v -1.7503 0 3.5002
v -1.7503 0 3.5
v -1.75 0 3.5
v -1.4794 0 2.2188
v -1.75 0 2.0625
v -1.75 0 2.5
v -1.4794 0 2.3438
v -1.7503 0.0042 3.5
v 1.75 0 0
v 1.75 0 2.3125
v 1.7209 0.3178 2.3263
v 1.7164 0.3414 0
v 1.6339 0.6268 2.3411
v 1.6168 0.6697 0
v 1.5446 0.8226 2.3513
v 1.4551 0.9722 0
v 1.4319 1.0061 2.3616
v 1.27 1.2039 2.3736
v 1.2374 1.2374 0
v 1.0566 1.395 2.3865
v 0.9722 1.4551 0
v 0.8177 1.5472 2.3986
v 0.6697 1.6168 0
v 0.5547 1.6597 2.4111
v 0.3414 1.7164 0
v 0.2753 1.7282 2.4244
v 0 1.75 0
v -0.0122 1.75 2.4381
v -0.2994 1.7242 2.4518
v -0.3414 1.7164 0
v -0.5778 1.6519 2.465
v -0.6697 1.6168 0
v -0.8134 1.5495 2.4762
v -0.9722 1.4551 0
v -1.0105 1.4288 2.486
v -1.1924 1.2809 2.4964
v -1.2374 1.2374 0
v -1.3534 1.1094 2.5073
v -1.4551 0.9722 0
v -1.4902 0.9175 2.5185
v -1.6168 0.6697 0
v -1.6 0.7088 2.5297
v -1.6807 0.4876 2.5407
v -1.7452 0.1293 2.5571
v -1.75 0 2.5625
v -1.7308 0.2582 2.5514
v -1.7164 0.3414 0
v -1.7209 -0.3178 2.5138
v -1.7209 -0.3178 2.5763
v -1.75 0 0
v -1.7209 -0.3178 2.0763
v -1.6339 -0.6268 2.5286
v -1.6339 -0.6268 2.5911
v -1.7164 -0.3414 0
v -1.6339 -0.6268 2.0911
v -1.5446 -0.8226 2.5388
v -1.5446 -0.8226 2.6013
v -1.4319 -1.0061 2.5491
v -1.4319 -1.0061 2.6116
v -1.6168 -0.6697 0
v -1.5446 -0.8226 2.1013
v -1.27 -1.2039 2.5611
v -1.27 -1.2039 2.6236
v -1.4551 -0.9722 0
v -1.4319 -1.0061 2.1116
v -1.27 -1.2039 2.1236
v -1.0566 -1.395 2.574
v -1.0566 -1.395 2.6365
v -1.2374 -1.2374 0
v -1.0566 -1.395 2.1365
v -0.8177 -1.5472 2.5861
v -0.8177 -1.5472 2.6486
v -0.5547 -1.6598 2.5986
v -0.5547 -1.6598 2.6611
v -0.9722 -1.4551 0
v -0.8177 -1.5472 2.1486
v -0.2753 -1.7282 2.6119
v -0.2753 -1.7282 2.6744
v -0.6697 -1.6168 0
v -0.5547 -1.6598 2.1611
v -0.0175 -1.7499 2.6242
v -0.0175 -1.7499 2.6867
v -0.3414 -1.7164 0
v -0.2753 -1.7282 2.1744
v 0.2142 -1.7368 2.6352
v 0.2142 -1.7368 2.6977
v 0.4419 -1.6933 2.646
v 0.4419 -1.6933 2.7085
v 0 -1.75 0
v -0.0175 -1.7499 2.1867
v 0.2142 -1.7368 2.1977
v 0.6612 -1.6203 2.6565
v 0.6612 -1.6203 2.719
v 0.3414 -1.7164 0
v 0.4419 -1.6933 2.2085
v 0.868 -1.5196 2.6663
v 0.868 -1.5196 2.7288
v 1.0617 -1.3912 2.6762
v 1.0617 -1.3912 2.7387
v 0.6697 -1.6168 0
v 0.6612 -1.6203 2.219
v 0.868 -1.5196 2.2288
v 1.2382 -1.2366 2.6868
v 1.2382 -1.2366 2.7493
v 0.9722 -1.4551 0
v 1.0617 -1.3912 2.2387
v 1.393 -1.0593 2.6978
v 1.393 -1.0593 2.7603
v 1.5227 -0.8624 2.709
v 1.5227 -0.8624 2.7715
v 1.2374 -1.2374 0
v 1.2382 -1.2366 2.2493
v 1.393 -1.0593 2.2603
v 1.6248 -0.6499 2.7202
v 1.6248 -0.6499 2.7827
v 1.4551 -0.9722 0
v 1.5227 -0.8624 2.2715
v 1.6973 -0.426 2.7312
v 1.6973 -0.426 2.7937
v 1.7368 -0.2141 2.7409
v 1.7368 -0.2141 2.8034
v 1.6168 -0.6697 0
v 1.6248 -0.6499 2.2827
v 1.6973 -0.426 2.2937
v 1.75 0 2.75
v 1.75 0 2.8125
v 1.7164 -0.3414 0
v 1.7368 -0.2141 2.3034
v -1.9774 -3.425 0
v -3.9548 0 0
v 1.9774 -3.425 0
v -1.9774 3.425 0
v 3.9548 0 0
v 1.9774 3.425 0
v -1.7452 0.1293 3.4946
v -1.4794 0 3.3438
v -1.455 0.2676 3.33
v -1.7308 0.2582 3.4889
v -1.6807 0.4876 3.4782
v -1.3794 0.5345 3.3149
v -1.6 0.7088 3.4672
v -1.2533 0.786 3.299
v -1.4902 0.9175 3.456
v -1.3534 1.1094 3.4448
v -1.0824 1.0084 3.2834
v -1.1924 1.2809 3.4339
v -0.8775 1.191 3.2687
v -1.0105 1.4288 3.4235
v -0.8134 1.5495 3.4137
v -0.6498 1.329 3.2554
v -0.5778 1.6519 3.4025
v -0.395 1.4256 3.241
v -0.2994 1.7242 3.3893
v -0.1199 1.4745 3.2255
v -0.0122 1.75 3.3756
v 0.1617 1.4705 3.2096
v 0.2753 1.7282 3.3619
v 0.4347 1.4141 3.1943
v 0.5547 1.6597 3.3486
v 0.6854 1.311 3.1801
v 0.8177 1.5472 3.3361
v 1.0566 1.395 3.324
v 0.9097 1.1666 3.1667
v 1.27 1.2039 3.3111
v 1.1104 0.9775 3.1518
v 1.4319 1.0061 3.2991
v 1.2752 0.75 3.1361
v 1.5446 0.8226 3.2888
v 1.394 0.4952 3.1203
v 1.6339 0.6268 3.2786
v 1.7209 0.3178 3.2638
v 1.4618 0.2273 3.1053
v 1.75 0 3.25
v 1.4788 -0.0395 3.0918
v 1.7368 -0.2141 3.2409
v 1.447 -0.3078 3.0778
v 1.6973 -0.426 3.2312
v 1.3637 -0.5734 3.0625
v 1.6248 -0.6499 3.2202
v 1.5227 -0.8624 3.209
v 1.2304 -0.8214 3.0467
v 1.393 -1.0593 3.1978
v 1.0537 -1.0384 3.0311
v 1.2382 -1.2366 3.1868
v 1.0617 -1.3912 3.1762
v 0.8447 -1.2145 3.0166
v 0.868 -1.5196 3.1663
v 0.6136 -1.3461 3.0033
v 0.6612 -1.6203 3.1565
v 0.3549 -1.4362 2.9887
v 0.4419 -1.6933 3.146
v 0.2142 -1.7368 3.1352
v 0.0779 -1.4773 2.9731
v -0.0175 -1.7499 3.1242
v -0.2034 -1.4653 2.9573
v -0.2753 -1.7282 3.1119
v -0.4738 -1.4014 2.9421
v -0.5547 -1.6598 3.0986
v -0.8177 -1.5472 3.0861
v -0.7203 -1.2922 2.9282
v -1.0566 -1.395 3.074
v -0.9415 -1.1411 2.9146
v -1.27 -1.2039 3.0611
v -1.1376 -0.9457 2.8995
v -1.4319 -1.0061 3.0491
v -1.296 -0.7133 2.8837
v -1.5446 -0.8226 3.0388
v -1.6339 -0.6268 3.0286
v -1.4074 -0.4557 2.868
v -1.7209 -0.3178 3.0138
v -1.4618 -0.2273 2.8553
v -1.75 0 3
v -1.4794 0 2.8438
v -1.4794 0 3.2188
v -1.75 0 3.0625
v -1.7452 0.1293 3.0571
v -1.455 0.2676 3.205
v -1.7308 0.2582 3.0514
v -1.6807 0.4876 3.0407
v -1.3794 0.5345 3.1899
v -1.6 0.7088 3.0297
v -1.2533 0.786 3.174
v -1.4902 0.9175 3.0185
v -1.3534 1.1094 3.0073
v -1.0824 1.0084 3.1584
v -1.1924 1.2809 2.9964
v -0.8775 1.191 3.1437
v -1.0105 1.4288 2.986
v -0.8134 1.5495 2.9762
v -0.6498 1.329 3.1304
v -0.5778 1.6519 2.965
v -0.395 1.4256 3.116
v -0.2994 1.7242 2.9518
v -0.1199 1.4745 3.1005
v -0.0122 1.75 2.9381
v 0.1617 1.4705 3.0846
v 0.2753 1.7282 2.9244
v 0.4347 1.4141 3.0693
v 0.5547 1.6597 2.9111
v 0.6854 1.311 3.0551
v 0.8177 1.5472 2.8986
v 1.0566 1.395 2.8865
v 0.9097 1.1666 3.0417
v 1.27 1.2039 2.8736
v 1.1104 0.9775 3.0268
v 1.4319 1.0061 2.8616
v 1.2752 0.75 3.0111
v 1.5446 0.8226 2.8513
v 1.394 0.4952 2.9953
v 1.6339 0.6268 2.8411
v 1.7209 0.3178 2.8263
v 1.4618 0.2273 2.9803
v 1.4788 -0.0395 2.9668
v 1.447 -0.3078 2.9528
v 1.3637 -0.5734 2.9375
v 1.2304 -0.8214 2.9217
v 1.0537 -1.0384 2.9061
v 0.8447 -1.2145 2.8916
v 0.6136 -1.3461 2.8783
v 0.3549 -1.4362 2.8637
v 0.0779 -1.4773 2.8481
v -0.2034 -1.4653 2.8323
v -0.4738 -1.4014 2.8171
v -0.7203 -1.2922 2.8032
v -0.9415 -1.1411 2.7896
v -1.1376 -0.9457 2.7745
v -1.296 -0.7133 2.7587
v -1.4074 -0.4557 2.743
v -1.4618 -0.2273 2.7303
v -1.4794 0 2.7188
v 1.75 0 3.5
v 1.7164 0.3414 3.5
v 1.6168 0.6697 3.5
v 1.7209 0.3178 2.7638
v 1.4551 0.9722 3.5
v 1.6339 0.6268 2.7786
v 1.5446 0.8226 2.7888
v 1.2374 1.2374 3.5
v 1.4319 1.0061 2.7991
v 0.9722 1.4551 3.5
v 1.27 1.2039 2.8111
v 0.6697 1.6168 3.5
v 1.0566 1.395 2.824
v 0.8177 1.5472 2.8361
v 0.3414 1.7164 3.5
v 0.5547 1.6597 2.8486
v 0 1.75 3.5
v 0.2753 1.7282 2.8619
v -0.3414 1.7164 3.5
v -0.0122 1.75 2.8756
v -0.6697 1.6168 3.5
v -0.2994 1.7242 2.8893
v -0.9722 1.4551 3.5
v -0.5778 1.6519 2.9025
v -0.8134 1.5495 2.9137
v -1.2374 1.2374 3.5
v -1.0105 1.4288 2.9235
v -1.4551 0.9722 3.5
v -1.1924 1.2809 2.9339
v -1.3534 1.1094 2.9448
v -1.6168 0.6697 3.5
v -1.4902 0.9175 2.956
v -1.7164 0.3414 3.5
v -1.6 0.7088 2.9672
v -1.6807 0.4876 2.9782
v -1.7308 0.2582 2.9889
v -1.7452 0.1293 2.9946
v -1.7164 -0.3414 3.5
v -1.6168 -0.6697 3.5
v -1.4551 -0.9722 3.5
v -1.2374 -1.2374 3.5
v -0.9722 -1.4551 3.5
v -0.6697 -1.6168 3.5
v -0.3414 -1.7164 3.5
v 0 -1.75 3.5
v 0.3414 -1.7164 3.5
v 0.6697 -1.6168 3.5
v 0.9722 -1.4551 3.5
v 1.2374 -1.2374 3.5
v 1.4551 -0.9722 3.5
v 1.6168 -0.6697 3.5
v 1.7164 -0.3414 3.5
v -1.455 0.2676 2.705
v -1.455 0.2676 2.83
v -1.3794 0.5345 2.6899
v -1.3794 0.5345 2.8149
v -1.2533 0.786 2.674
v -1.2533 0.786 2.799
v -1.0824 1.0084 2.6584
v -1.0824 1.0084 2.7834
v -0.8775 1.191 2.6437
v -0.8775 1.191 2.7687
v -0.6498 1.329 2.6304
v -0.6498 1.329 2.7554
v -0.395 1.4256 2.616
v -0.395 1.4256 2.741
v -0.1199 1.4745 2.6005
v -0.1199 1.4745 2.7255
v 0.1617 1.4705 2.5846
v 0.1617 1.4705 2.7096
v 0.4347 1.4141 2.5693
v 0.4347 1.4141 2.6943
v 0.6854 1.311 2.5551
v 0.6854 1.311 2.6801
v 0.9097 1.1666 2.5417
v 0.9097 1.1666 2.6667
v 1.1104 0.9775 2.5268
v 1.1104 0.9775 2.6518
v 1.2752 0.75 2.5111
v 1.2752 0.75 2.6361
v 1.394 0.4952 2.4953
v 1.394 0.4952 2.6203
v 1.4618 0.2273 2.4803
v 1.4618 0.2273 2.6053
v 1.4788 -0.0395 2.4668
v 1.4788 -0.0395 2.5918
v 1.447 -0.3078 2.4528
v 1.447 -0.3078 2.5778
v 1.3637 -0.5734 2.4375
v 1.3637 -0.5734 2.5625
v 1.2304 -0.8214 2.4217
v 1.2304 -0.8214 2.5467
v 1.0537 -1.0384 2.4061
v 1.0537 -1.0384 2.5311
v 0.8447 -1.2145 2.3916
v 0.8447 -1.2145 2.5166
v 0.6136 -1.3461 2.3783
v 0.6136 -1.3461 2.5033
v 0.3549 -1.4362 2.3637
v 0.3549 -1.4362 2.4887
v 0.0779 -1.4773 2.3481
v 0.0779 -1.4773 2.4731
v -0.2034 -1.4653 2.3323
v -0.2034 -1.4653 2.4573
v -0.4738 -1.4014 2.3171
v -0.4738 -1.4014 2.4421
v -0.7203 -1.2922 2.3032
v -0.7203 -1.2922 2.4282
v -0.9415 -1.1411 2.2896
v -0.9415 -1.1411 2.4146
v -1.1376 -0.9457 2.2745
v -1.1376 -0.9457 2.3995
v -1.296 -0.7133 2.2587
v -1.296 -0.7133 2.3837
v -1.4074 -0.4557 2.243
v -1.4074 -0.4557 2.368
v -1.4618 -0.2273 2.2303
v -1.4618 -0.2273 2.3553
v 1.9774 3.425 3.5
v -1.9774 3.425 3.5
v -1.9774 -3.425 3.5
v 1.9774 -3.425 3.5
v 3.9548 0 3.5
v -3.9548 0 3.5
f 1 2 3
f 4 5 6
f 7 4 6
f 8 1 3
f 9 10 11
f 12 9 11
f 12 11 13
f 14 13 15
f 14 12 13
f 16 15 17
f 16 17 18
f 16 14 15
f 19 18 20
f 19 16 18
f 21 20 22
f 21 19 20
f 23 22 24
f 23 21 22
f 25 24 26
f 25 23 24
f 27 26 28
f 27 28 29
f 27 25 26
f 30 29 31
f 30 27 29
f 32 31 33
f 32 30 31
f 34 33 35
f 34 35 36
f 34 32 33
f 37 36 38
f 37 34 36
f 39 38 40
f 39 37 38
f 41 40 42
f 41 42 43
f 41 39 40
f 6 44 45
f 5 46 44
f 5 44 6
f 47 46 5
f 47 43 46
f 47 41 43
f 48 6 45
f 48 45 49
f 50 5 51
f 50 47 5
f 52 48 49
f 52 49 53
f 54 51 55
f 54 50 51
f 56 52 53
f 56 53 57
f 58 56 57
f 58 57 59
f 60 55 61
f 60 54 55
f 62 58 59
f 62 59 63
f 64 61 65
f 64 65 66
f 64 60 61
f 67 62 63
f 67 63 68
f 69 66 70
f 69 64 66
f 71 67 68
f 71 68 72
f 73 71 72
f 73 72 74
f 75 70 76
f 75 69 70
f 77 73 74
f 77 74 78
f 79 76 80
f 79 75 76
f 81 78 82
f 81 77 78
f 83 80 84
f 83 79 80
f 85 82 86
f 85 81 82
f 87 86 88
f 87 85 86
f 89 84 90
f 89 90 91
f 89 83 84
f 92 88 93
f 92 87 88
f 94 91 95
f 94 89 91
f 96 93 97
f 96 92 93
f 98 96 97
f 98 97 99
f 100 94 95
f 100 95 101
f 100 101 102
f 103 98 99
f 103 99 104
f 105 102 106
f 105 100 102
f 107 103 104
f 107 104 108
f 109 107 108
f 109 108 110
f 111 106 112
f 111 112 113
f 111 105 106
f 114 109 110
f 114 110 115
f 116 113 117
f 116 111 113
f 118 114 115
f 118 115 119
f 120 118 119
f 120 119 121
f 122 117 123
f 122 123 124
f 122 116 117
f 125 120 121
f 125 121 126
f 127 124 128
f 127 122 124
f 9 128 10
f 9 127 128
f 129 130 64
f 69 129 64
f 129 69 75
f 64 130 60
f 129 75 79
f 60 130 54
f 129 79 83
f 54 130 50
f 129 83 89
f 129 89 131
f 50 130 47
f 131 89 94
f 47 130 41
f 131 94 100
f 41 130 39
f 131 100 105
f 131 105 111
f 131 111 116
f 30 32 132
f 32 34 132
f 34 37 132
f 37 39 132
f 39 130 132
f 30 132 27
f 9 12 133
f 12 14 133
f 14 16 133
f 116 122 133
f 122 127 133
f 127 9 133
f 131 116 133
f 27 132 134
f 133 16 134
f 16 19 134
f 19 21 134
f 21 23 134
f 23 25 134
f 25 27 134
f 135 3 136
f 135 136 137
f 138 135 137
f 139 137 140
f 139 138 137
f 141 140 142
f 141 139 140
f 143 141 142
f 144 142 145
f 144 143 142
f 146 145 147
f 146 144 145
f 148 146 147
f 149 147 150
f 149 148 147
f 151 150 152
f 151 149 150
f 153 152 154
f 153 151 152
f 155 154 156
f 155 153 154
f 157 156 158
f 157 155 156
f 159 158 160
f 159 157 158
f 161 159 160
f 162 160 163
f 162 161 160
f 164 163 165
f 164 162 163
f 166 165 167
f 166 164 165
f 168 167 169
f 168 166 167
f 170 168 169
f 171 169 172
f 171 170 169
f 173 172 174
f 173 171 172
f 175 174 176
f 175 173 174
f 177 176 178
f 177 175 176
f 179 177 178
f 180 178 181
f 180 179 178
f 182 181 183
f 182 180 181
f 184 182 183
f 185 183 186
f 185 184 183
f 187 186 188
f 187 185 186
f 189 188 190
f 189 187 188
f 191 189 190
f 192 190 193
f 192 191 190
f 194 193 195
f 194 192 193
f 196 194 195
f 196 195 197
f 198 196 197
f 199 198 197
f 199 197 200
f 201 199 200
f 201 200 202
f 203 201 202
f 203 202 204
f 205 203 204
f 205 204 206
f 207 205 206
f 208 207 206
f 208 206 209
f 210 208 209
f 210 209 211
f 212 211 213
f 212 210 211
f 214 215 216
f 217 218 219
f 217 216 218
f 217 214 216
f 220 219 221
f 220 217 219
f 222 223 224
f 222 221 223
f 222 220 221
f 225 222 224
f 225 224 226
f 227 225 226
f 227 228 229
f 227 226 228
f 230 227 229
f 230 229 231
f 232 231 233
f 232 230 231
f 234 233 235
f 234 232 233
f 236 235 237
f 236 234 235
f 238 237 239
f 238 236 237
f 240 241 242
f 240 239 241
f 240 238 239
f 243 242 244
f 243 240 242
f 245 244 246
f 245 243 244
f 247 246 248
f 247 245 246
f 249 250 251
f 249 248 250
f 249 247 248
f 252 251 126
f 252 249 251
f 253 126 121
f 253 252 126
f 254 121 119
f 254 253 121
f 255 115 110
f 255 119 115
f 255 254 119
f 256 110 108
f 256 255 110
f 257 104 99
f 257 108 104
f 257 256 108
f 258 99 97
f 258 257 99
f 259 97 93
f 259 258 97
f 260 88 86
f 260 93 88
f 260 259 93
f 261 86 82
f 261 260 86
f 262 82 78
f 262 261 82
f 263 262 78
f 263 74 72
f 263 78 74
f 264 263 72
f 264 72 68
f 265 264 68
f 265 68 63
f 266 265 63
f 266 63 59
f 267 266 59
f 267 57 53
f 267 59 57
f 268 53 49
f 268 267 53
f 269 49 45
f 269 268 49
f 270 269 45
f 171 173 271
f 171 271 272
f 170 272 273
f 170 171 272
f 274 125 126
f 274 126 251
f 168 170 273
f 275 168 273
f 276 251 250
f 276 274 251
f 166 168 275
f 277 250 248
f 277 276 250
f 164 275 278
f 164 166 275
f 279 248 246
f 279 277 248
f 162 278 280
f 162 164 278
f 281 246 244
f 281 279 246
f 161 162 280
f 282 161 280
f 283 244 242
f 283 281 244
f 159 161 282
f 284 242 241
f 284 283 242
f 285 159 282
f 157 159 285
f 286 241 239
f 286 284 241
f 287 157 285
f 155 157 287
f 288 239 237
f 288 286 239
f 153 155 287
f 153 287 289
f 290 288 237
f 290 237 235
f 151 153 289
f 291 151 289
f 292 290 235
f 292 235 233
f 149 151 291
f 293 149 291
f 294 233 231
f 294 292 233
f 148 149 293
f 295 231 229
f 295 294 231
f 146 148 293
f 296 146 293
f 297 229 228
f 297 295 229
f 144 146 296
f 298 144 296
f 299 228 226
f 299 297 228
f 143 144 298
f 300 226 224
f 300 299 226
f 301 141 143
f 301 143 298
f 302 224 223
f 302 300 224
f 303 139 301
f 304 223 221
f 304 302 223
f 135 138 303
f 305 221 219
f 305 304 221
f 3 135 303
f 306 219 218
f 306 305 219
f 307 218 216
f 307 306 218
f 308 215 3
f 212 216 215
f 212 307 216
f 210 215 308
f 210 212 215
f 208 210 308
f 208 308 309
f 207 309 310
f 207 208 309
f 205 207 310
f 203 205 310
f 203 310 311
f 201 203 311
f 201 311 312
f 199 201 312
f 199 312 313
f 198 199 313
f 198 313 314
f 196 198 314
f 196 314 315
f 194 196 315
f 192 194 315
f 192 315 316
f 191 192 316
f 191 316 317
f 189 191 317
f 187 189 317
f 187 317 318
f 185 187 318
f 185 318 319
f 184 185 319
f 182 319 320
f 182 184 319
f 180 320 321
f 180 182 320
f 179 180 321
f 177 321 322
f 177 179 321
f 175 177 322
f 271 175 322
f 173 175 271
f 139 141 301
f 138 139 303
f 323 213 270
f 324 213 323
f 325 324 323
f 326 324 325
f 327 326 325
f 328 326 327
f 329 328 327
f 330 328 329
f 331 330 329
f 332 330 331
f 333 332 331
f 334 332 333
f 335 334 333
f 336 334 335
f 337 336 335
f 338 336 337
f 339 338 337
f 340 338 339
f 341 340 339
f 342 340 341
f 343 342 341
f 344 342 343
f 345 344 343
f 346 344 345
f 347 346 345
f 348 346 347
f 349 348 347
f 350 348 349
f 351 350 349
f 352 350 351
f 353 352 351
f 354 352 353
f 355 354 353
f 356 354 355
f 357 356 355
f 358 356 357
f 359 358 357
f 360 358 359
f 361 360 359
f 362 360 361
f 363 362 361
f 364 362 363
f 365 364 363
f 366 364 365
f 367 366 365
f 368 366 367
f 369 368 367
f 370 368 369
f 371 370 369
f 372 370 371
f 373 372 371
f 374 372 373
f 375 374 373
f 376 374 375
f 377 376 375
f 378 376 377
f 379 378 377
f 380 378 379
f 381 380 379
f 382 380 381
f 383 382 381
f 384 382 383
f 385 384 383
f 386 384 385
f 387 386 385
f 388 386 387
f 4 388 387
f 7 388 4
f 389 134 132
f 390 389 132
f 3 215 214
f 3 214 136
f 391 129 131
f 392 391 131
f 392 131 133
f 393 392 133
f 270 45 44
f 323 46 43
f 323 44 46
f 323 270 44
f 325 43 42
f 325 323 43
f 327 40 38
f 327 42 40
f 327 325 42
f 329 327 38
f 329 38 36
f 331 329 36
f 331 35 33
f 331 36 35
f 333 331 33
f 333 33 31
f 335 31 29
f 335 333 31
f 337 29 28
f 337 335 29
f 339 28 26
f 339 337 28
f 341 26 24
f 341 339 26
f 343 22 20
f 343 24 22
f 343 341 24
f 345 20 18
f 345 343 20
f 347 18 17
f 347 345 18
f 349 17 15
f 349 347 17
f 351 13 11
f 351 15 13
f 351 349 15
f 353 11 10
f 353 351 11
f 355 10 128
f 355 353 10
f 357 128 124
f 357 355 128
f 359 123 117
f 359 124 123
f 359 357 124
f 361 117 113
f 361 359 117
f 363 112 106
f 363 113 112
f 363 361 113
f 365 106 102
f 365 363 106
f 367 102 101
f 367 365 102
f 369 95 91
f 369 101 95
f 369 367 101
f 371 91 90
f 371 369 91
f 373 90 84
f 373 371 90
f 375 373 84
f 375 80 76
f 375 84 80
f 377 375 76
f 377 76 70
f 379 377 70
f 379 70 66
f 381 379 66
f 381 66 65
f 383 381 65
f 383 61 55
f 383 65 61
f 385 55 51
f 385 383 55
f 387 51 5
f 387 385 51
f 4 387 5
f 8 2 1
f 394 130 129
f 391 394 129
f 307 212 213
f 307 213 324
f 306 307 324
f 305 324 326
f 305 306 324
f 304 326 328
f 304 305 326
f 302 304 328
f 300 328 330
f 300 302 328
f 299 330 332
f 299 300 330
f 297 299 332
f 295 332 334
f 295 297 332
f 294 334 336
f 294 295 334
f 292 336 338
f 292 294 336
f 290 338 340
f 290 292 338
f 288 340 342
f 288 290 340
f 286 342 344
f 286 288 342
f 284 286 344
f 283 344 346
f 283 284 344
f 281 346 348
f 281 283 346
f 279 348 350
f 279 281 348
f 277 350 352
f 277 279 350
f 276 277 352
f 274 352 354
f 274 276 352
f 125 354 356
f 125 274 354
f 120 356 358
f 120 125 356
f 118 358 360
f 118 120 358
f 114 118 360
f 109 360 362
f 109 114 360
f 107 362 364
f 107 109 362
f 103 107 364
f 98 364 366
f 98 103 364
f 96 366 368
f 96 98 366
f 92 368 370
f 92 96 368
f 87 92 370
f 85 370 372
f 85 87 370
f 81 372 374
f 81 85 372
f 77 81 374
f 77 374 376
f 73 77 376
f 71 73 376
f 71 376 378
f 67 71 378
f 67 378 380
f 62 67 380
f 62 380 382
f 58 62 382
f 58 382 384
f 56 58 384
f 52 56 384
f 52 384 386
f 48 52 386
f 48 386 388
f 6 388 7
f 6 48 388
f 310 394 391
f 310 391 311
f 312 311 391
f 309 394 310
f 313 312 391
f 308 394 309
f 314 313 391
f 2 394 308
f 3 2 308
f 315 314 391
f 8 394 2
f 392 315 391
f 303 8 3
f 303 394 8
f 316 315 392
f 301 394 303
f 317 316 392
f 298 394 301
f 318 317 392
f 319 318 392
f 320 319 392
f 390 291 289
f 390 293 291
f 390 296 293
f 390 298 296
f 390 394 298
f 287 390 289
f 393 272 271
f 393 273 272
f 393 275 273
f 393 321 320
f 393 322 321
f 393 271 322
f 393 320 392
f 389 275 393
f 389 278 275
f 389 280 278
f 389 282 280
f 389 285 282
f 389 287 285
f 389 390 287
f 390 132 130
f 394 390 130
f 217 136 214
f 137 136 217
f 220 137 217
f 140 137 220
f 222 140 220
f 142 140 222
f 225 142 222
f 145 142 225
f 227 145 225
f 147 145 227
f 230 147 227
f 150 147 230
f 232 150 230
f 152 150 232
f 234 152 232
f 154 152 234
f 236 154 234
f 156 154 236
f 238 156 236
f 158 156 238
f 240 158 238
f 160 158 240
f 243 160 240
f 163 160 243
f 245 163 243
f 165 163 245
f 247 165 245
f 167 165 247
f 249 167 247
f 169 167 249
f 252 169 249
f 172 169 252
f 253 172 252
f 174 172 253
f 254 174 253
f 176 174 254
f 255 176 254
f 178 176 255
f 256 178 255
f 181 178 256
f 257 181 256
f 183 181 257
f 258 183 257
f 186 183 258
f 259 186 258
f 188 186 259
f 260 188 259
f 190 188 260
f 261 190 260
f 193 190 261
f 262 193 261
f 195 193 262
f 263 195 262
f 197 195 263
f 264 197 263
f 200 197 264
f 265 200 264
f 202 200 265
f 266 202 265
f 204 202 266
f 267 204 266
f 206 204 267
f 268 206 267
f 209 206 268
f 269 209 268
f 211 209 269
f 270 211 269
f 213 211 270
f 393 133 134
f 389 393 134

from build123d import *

# Parameters (mm, degrees)
SKETCH1_R           = 1.75
BOSS_EXTRUDE1_DEPTH = 3.5
THREAD1_PITCH       = 0.5


with BuildPart() as part:
    # Sketch1 → Boss-Extrude1 (new body)
    with BuildSketch(Plane.XY):
        Polygon((3.954849344, 0), (1.977424672, 3.425), (-1.977424672, 3.425), (-3.954849344, 0), (-1.977424672, -3.425), (1.977424672, -3.425), align=None)
        Circle(SKETCH1_R, mode=Mode.SUBTRACT)
    extrude(amount=BOSS_EXTRUDE1_DEPTH)

    # Thread1: the profile of Thread Profile1 profile screwed along a right-hand helix of 2 turns, 6 arcs to a turn; built about Z, then put on its axis
    thread1_z = Axis((0, 0, 0), (0, 0, 1))
    thread1_corners = [(1.7503, 0, -0.000173205), (1.7503, 0, 0.437673204), (1.479367063, 0, 0.281249999), (1.479367062, 0, 0.156249999)]
    with BuildLine(mode=Mode.PRIVATE) as thread1_profile:
        Line(thread1_corners[0], thread1_corners[1])
        Line(thread1_corners[1], thread1_corners[2])
        Line(thread1_corners[2], thread1_corners[3])
        Line(thread1_corners[3], thread1_corners[0])
    thread1_cap = Face(thread1_profile.wire())
    thread1_turn_angles = [0, 30, 60, 90, 120, 150, 180, 210, 240, 270, 300, 330, 360]
    thread1_turn_weights = [1, 0.8660254037844387, 1, 0.8660254037844387, 1, 0.8660254037844387, 1, 0.8660254037844387, 1, 0.8660254037844387, 1, 0.8660254037844387, 1]
    thread1_turn_rails = [Edge.make_bspline([Vector(p[0], p[1], 0).rotate(thread1_z, thread1_turn_angles[k]) / thread1_turn_weights[k] + Vector(0, 0, p[2] + THREAD1_PITCH * thread1_turn_angles[k] / 360) for k in range(13)], [0, 0, 0, 1, 1, 2, 2, 3, 3, 4, 4, 5, 5, 6, 6, 6], 2, thread1_turn_weights) for p in thread1_corners]
    thread1_turn_sides = [Face.make_surface_from_curves(thread1_turn_rails[p[0]], thread1_turn_rails[p[1]]) for p in [(0, 1), (1, 2), (2, 3), (3, 0)]]
    thread1 = Plane(origin=(0, 0, 3.5), x_dir=(-1, 0, 0), z_dir=(0, 0, -1)) * Solid(Shell([*[p.moved(Location((0, 0, THREAD1_PITCH * i))) for i in range(2) for p in thread1_turn_sides], thread1_cap, thread1_cap.rotate(thread1_z, 720).moved(Location((0, 0, THREAD1_PITCH * 720 / 360)))]))
    add(thread1)


solid = part.part
